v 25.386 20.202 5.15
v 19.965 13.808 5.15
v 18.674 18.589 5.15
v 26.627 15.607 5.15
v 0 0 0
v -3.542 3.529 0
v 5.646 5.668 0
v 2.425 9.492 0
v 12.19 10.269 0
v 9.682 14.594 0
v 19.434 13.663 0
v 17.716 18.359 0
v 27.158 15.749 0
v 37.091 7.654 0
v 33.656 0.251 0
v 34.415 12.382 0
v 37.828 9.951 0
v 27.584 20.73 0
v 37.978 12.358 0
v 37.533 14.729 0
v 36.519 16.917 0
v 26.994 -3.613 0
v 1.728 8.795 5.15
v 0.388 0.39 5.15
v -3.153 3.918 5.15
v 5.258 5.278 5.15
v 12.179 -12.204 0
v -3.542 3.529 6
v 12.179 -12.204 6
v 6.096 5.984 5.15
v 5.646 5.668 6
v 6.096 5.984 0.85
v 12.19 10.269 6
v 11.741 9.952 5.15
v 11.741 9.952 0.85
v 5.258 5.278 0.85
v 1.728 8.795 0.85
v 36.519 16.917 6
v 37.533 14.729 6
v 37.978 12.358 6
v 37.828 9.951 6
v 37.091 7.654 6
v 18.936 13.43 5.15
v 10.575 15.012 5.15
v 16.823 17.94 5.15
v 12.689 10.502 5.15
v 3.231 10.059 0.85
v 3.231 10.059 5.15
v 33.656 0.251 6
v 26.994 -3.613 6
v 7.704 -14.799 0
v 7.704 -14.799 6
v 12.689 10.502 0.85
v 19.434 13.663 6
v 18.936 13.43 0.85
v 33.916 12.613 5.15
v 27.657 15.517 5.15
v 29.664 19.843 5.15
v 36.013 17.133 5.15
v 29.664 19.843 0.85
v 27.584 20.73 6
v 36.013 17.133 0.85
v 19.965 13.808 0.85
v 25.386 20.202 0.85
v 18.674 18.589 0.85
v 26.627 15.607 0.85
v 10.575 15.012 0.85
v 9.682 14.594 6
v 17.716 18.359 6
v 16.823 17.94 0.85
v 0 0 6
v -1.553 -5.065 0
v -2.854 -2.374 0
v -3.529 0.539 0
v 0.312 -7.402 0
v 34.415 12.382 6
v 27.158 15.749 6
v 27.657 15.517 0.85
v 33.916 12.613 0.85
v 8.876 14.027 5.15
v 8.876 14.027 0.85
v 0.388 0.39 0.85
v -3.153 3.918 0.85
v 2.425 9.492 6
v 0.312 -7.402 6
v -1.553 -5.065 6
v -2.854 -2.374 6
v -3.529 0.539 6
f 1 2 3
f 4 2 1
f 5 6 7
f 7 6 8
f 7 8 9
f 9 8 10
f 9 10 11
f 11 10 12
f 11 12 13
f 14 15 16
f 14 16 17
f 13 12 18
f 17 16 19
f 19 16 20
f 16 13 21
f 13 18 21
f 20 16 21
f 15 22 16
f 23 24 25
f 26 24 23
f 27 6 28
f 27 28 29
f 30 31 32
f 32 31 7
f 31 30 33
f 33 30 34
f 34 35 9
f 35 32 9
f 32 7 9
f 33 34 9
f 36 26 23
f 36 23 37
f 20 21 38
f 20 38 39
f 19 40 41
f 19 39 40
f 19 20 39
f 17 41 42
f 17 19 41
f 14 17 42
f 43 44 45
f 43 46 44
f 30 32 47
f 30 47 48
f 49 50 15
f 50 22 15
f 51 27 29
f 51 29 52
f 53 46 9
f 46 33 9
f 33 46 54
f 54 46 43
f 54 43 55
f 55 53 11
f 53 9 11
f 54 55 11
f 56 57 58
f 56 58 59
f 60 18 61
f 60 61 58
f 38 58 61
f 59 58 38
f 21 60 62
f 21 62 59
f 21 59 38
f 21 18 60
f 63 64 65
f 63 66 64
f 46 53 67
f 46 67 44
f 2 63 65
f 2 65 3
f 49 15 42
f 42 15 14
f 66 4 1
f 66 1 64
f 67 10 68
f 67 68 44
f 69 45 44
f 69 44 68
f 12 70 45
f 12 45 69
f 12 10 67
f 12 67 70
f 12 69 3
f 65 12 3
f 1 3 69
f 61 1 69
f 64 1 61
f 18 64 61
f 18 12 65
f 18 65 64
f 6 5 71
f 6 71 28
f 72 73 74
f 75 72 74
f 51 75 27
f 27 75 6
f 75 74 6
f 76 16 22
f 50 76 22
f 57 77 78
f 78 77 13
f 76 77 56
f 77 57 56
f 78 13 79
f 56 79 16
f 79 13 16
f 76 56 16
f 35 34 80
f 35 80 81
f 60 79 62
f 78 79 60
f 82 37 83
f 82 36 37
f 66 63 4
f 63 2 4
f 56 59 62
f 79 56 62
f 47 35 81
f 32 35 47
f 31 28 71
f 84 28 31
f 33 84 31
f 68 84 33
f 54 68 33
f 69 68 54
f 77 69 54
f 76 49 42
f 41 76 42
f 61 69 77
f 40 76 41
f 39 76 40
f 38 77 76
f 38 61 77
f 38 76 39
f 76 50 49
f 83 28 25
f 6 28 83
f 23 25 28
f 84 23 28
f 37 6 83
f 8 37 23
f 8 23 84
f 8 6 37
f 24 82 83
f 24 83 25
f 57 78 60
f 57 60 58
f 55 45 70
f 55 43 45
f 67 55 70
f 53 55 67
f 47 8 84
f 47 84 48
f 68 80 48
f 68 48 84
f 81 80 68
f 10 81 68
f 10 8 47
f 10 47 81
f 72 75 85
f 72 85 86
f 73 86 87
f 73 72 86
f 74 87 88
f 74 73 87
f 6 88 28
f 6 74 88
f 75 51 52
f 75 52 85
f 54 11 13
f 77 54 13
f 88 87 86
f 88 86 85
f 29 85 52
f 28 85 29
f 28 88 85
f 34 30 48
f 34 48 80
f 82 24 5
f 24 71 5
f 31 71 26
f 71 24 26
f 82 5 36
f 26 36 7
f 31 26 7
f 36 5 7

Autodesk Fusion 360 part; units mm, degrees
sketch "Sketch1" plane through (0, 0, 0) normal (0, 0, 1) x (1, 0, 0)
  line L0 (0, 0) -> (5.6461, 5.6676)
  line L1 (5.6461, 5.6676) -> (12.1905, 10.2687)
  line L2 (12.1905, 10.2687) -> (19.4345, 13.6634)
  line L3 (19.4345, 13.6634) -> (27.158, 15.7487)
  line L4 (27.158, 15.7487) -> (34.4149, 12.3816)
  line L5 (0, 0) -> (-3.5423, 3.5288)
  line L6 (5.6461, 5.6676) -> (2.4248, 9.4917)
  line L7 (12.1905, 10.2687) -> (9.6823, 14.5941)
  line L8 (19.4345, 13.6634) -> (17.7155, 18.3586)
  line L9 (27.158, 15.7487) -> (27.5843, 20.7305)
  line L10 (34.4149, 12.3816) -> (36.5193, 16.9171)
  line L11 (-3.5423, 3.5288) -> (2.4248, 9.4917)
  line L12 (2.4248, 9.4917) -> (9.6823, 14.5941)
  line L13 (9.6823, 14.5941) -> (17.7155, 18.3586)
  line L14 (17.7155, 18.3586) -> (27.5843, 20.7305)
  line L15 (27.5843, 20.7305) -> (36.5193, 16.9171)
  line L16 (26.9936, -3.6128) -> (33.656, 0.2507)
  line L17 (12.1791, -12.2036) -> (7.7039, -14.7988)
  line L18 (7.7039, -14.7988) -> (0.3124, -7.4021)
  line L19 (-3.5423, 3.5288) -> (12.1791, -12.2036)
  line L20 (36.5193, 16.9171) -> (26.9936, -3.6128)
  line L21 (33.656, 0.2507) -> (37.0912, 7.6543)
  arc A0 (-3.5423, 3.5288) -> (0.3124, -7.4021) centre (9.8153, 2.0941) ccw
  arc A1 (37.0912, 7.6543) -> (36.5193, 16.9171) centre (28.2481, 11.7574) ccw
  line L22 (7.7039, -14.7988) -> (12.1791, -12.2036)
  line L23 (26.9936, -3.6128) -> (33.656, 0.2507)
  dimension "d1" = 170
  dimension "d2" = 170
  dimension "d3" = 170
  dimension "d4" = 140
  dimension "d5" = 8
  dimension "d6" = 8
  dimension "d7" = 8
  dimension "d8" = 8
  dimension "d9" = 8
  dimension "d10" = 5
  dimension "d11" = 5
  dimension "d12" = 5
  dimension "d13" = 5
  dimension "d14" = 5
  dimension "d15" = 5
  dimension "d16" = 95
  dimension "d17" = 95
  dimension "d18" = 95
  dimension "d19" = 110
  dimension "d24" = 30
extrude "Extrude1" add sketch "Sketch1" along normal blind 6
sketch "Sketch3" plane through (0, 0, 0) normal (0.7085, -0.7058, 0) x (0.7058, 0.7085, 0)
  line L0 (0, 0) -> (8, 0)
  line L1 (8, 0) -> (8, 6)
  line L2 (8, 6) -> (0, 6)
  line L3 (0, 6) -> (0, 0)
  line L4 (0.55, 5.15) -> (7.45, 5.15)
  line L5 (7.45, 5.15) -> (7.45, 0.85)
  line L6 (7.45, 0.85) -> (0.55, 0.85)
  line L7 (0.55, 0.85) -> (0.55, 5.15)
  dimension "d27" = 6.9
  dimension "d28" = 4.3
  dimension "d29" = 0.85
  dimension "d30" = 0.55
extrude "Extrude2" cut sketch "Sketch3" against normal blind 9 contours L4 L5 L6 L7
sketch "Sketch4" plane through (-0.799, 1.1364, 0) normal (0.5751, -0.8181, 0) x (0.8181, 0.5751, 0)
  line L0 (7.8785, 0) -> (15.8785, 0)
  line L1 (15.8785, 0) -> (15.8785, 6)
  line L2 (15.8785, 6) -> (7.8785, 6)
  line L3 (7.8785, 6) -> (7.8785, 0)
  line L4 (8.4285, 5.15) -> (15.3285, 5.15)
  line L5 (15.3285, 5.15) -> (15.3285, 0.85)
  line L6 (15.3285, 0.85) -> (8.4285, 0.85)
  line L7 (8.4285, 0.85) -> (8.4285, 5.15)
  dimension "d33" = 4.3
  dimension "d34" = 6.9
  dimension "d35" = 0.55
  dimension "d36" = 0.85
extrude "Extrude3" cut sketch "Sketch4" against normal blind 12 contours L4 L5 L6 L7
sketch "Sketch5" plane through (-1.7506, 3.7355, 0) normal (0.4243, -0.9055, 0) x (0.9055, 0.4243, 0)
  line L0 (15.396, 0) -> (23.396, 0)
  line L1 (23.396, 0) -> (23.396, 6)
  line L2 (23.396, 6) -> (15.396, 6)
  line L3 (15.396, 6) -> (15.396, 0)
  line L4 (15.946, 5.15) -> (22.846, 5.15)
  line L5 (22.846, 5.15) -> (22.846, 0.85)
  line L6 (22.846, 0.85) -> (15.946, 0.85)
  line L7 (15.946, 0.85) -> (15.946, 5.15)
  dimension "d39" = 6.9
  dimension "d40" = 4.3
  dimension "d41" = 0.55
  dimension "d42" = 0.85
extrude "Extrude4" cut sketch "Sketch5" against normal blind 10 contours L4 L5 L6 L7
sketch "Sketch6" plane through (-2.1179, 7.8445, 0) normal (0.2607, -0.9654, 0) x (0.9654, 0.2607, 0)
  line L0 (22.3242, 0) -> (30.3242, 0)
  line L1 (30.3242, 0) -> (30.3242, 6)
  line L2 (30.3242, 6) -> (22.3242, 6)
  line L3 (22.3242, 6) -> (22.3242, 0)
  line L4 (22.8742, 5.15) -> (29.7742, 5.15)
  line L5 (29.7742, 5.15) -> (29.7742, 0.85)
  line L6 (29.7742, 0.85) -> (22.8742, 0.85)
  line L7 (22.8742, 0.85) -> (22.8742, 5.15)
  dimension "d45" = 4.3
  dimension "d46" = 0.85
  dimension "d47" = 6.9
  dimension "d48" = 0.55
extrude "Extrude5" cut sketch "Sketch6" against normal blind 12 contours L4 L5 L6 L7
sketch "Sketch7" plane through (10.8238, 23.3276, 0) normal (-0.4209, -0.9071, 0) x (0.9071, -0.4209, 0)
  line L0 (18.0068, 0) -> (26.0068, 0)
  line L1 (26.0068, 0) -> (26.0068, 6)
  line L2 (26.0068, 6) -> (18.0068, 6)
  line L3 (18.0068, 6) -> (18.0068, 0)
  line L4 (18.5568, 5.15) -> (25.4568, 5.15)
  line L5 (25.4568, 5.15) -> (25.4568, 0.85)
  line L6 (25.4568, 0.85) -> (18.5568, 0.85)
  line L7 (18.5568, 0.85) -> (18.5568, 5.15)
  dimension "d51" = 4.3
  dimension "d52" = 6.9
  dimension "d53" = 0.55
  dimension "d54" = 0.85
extrude "Extrude6" cut sketch "Sketch7" against normal blind 15 contours L4 L5 L6 L7
